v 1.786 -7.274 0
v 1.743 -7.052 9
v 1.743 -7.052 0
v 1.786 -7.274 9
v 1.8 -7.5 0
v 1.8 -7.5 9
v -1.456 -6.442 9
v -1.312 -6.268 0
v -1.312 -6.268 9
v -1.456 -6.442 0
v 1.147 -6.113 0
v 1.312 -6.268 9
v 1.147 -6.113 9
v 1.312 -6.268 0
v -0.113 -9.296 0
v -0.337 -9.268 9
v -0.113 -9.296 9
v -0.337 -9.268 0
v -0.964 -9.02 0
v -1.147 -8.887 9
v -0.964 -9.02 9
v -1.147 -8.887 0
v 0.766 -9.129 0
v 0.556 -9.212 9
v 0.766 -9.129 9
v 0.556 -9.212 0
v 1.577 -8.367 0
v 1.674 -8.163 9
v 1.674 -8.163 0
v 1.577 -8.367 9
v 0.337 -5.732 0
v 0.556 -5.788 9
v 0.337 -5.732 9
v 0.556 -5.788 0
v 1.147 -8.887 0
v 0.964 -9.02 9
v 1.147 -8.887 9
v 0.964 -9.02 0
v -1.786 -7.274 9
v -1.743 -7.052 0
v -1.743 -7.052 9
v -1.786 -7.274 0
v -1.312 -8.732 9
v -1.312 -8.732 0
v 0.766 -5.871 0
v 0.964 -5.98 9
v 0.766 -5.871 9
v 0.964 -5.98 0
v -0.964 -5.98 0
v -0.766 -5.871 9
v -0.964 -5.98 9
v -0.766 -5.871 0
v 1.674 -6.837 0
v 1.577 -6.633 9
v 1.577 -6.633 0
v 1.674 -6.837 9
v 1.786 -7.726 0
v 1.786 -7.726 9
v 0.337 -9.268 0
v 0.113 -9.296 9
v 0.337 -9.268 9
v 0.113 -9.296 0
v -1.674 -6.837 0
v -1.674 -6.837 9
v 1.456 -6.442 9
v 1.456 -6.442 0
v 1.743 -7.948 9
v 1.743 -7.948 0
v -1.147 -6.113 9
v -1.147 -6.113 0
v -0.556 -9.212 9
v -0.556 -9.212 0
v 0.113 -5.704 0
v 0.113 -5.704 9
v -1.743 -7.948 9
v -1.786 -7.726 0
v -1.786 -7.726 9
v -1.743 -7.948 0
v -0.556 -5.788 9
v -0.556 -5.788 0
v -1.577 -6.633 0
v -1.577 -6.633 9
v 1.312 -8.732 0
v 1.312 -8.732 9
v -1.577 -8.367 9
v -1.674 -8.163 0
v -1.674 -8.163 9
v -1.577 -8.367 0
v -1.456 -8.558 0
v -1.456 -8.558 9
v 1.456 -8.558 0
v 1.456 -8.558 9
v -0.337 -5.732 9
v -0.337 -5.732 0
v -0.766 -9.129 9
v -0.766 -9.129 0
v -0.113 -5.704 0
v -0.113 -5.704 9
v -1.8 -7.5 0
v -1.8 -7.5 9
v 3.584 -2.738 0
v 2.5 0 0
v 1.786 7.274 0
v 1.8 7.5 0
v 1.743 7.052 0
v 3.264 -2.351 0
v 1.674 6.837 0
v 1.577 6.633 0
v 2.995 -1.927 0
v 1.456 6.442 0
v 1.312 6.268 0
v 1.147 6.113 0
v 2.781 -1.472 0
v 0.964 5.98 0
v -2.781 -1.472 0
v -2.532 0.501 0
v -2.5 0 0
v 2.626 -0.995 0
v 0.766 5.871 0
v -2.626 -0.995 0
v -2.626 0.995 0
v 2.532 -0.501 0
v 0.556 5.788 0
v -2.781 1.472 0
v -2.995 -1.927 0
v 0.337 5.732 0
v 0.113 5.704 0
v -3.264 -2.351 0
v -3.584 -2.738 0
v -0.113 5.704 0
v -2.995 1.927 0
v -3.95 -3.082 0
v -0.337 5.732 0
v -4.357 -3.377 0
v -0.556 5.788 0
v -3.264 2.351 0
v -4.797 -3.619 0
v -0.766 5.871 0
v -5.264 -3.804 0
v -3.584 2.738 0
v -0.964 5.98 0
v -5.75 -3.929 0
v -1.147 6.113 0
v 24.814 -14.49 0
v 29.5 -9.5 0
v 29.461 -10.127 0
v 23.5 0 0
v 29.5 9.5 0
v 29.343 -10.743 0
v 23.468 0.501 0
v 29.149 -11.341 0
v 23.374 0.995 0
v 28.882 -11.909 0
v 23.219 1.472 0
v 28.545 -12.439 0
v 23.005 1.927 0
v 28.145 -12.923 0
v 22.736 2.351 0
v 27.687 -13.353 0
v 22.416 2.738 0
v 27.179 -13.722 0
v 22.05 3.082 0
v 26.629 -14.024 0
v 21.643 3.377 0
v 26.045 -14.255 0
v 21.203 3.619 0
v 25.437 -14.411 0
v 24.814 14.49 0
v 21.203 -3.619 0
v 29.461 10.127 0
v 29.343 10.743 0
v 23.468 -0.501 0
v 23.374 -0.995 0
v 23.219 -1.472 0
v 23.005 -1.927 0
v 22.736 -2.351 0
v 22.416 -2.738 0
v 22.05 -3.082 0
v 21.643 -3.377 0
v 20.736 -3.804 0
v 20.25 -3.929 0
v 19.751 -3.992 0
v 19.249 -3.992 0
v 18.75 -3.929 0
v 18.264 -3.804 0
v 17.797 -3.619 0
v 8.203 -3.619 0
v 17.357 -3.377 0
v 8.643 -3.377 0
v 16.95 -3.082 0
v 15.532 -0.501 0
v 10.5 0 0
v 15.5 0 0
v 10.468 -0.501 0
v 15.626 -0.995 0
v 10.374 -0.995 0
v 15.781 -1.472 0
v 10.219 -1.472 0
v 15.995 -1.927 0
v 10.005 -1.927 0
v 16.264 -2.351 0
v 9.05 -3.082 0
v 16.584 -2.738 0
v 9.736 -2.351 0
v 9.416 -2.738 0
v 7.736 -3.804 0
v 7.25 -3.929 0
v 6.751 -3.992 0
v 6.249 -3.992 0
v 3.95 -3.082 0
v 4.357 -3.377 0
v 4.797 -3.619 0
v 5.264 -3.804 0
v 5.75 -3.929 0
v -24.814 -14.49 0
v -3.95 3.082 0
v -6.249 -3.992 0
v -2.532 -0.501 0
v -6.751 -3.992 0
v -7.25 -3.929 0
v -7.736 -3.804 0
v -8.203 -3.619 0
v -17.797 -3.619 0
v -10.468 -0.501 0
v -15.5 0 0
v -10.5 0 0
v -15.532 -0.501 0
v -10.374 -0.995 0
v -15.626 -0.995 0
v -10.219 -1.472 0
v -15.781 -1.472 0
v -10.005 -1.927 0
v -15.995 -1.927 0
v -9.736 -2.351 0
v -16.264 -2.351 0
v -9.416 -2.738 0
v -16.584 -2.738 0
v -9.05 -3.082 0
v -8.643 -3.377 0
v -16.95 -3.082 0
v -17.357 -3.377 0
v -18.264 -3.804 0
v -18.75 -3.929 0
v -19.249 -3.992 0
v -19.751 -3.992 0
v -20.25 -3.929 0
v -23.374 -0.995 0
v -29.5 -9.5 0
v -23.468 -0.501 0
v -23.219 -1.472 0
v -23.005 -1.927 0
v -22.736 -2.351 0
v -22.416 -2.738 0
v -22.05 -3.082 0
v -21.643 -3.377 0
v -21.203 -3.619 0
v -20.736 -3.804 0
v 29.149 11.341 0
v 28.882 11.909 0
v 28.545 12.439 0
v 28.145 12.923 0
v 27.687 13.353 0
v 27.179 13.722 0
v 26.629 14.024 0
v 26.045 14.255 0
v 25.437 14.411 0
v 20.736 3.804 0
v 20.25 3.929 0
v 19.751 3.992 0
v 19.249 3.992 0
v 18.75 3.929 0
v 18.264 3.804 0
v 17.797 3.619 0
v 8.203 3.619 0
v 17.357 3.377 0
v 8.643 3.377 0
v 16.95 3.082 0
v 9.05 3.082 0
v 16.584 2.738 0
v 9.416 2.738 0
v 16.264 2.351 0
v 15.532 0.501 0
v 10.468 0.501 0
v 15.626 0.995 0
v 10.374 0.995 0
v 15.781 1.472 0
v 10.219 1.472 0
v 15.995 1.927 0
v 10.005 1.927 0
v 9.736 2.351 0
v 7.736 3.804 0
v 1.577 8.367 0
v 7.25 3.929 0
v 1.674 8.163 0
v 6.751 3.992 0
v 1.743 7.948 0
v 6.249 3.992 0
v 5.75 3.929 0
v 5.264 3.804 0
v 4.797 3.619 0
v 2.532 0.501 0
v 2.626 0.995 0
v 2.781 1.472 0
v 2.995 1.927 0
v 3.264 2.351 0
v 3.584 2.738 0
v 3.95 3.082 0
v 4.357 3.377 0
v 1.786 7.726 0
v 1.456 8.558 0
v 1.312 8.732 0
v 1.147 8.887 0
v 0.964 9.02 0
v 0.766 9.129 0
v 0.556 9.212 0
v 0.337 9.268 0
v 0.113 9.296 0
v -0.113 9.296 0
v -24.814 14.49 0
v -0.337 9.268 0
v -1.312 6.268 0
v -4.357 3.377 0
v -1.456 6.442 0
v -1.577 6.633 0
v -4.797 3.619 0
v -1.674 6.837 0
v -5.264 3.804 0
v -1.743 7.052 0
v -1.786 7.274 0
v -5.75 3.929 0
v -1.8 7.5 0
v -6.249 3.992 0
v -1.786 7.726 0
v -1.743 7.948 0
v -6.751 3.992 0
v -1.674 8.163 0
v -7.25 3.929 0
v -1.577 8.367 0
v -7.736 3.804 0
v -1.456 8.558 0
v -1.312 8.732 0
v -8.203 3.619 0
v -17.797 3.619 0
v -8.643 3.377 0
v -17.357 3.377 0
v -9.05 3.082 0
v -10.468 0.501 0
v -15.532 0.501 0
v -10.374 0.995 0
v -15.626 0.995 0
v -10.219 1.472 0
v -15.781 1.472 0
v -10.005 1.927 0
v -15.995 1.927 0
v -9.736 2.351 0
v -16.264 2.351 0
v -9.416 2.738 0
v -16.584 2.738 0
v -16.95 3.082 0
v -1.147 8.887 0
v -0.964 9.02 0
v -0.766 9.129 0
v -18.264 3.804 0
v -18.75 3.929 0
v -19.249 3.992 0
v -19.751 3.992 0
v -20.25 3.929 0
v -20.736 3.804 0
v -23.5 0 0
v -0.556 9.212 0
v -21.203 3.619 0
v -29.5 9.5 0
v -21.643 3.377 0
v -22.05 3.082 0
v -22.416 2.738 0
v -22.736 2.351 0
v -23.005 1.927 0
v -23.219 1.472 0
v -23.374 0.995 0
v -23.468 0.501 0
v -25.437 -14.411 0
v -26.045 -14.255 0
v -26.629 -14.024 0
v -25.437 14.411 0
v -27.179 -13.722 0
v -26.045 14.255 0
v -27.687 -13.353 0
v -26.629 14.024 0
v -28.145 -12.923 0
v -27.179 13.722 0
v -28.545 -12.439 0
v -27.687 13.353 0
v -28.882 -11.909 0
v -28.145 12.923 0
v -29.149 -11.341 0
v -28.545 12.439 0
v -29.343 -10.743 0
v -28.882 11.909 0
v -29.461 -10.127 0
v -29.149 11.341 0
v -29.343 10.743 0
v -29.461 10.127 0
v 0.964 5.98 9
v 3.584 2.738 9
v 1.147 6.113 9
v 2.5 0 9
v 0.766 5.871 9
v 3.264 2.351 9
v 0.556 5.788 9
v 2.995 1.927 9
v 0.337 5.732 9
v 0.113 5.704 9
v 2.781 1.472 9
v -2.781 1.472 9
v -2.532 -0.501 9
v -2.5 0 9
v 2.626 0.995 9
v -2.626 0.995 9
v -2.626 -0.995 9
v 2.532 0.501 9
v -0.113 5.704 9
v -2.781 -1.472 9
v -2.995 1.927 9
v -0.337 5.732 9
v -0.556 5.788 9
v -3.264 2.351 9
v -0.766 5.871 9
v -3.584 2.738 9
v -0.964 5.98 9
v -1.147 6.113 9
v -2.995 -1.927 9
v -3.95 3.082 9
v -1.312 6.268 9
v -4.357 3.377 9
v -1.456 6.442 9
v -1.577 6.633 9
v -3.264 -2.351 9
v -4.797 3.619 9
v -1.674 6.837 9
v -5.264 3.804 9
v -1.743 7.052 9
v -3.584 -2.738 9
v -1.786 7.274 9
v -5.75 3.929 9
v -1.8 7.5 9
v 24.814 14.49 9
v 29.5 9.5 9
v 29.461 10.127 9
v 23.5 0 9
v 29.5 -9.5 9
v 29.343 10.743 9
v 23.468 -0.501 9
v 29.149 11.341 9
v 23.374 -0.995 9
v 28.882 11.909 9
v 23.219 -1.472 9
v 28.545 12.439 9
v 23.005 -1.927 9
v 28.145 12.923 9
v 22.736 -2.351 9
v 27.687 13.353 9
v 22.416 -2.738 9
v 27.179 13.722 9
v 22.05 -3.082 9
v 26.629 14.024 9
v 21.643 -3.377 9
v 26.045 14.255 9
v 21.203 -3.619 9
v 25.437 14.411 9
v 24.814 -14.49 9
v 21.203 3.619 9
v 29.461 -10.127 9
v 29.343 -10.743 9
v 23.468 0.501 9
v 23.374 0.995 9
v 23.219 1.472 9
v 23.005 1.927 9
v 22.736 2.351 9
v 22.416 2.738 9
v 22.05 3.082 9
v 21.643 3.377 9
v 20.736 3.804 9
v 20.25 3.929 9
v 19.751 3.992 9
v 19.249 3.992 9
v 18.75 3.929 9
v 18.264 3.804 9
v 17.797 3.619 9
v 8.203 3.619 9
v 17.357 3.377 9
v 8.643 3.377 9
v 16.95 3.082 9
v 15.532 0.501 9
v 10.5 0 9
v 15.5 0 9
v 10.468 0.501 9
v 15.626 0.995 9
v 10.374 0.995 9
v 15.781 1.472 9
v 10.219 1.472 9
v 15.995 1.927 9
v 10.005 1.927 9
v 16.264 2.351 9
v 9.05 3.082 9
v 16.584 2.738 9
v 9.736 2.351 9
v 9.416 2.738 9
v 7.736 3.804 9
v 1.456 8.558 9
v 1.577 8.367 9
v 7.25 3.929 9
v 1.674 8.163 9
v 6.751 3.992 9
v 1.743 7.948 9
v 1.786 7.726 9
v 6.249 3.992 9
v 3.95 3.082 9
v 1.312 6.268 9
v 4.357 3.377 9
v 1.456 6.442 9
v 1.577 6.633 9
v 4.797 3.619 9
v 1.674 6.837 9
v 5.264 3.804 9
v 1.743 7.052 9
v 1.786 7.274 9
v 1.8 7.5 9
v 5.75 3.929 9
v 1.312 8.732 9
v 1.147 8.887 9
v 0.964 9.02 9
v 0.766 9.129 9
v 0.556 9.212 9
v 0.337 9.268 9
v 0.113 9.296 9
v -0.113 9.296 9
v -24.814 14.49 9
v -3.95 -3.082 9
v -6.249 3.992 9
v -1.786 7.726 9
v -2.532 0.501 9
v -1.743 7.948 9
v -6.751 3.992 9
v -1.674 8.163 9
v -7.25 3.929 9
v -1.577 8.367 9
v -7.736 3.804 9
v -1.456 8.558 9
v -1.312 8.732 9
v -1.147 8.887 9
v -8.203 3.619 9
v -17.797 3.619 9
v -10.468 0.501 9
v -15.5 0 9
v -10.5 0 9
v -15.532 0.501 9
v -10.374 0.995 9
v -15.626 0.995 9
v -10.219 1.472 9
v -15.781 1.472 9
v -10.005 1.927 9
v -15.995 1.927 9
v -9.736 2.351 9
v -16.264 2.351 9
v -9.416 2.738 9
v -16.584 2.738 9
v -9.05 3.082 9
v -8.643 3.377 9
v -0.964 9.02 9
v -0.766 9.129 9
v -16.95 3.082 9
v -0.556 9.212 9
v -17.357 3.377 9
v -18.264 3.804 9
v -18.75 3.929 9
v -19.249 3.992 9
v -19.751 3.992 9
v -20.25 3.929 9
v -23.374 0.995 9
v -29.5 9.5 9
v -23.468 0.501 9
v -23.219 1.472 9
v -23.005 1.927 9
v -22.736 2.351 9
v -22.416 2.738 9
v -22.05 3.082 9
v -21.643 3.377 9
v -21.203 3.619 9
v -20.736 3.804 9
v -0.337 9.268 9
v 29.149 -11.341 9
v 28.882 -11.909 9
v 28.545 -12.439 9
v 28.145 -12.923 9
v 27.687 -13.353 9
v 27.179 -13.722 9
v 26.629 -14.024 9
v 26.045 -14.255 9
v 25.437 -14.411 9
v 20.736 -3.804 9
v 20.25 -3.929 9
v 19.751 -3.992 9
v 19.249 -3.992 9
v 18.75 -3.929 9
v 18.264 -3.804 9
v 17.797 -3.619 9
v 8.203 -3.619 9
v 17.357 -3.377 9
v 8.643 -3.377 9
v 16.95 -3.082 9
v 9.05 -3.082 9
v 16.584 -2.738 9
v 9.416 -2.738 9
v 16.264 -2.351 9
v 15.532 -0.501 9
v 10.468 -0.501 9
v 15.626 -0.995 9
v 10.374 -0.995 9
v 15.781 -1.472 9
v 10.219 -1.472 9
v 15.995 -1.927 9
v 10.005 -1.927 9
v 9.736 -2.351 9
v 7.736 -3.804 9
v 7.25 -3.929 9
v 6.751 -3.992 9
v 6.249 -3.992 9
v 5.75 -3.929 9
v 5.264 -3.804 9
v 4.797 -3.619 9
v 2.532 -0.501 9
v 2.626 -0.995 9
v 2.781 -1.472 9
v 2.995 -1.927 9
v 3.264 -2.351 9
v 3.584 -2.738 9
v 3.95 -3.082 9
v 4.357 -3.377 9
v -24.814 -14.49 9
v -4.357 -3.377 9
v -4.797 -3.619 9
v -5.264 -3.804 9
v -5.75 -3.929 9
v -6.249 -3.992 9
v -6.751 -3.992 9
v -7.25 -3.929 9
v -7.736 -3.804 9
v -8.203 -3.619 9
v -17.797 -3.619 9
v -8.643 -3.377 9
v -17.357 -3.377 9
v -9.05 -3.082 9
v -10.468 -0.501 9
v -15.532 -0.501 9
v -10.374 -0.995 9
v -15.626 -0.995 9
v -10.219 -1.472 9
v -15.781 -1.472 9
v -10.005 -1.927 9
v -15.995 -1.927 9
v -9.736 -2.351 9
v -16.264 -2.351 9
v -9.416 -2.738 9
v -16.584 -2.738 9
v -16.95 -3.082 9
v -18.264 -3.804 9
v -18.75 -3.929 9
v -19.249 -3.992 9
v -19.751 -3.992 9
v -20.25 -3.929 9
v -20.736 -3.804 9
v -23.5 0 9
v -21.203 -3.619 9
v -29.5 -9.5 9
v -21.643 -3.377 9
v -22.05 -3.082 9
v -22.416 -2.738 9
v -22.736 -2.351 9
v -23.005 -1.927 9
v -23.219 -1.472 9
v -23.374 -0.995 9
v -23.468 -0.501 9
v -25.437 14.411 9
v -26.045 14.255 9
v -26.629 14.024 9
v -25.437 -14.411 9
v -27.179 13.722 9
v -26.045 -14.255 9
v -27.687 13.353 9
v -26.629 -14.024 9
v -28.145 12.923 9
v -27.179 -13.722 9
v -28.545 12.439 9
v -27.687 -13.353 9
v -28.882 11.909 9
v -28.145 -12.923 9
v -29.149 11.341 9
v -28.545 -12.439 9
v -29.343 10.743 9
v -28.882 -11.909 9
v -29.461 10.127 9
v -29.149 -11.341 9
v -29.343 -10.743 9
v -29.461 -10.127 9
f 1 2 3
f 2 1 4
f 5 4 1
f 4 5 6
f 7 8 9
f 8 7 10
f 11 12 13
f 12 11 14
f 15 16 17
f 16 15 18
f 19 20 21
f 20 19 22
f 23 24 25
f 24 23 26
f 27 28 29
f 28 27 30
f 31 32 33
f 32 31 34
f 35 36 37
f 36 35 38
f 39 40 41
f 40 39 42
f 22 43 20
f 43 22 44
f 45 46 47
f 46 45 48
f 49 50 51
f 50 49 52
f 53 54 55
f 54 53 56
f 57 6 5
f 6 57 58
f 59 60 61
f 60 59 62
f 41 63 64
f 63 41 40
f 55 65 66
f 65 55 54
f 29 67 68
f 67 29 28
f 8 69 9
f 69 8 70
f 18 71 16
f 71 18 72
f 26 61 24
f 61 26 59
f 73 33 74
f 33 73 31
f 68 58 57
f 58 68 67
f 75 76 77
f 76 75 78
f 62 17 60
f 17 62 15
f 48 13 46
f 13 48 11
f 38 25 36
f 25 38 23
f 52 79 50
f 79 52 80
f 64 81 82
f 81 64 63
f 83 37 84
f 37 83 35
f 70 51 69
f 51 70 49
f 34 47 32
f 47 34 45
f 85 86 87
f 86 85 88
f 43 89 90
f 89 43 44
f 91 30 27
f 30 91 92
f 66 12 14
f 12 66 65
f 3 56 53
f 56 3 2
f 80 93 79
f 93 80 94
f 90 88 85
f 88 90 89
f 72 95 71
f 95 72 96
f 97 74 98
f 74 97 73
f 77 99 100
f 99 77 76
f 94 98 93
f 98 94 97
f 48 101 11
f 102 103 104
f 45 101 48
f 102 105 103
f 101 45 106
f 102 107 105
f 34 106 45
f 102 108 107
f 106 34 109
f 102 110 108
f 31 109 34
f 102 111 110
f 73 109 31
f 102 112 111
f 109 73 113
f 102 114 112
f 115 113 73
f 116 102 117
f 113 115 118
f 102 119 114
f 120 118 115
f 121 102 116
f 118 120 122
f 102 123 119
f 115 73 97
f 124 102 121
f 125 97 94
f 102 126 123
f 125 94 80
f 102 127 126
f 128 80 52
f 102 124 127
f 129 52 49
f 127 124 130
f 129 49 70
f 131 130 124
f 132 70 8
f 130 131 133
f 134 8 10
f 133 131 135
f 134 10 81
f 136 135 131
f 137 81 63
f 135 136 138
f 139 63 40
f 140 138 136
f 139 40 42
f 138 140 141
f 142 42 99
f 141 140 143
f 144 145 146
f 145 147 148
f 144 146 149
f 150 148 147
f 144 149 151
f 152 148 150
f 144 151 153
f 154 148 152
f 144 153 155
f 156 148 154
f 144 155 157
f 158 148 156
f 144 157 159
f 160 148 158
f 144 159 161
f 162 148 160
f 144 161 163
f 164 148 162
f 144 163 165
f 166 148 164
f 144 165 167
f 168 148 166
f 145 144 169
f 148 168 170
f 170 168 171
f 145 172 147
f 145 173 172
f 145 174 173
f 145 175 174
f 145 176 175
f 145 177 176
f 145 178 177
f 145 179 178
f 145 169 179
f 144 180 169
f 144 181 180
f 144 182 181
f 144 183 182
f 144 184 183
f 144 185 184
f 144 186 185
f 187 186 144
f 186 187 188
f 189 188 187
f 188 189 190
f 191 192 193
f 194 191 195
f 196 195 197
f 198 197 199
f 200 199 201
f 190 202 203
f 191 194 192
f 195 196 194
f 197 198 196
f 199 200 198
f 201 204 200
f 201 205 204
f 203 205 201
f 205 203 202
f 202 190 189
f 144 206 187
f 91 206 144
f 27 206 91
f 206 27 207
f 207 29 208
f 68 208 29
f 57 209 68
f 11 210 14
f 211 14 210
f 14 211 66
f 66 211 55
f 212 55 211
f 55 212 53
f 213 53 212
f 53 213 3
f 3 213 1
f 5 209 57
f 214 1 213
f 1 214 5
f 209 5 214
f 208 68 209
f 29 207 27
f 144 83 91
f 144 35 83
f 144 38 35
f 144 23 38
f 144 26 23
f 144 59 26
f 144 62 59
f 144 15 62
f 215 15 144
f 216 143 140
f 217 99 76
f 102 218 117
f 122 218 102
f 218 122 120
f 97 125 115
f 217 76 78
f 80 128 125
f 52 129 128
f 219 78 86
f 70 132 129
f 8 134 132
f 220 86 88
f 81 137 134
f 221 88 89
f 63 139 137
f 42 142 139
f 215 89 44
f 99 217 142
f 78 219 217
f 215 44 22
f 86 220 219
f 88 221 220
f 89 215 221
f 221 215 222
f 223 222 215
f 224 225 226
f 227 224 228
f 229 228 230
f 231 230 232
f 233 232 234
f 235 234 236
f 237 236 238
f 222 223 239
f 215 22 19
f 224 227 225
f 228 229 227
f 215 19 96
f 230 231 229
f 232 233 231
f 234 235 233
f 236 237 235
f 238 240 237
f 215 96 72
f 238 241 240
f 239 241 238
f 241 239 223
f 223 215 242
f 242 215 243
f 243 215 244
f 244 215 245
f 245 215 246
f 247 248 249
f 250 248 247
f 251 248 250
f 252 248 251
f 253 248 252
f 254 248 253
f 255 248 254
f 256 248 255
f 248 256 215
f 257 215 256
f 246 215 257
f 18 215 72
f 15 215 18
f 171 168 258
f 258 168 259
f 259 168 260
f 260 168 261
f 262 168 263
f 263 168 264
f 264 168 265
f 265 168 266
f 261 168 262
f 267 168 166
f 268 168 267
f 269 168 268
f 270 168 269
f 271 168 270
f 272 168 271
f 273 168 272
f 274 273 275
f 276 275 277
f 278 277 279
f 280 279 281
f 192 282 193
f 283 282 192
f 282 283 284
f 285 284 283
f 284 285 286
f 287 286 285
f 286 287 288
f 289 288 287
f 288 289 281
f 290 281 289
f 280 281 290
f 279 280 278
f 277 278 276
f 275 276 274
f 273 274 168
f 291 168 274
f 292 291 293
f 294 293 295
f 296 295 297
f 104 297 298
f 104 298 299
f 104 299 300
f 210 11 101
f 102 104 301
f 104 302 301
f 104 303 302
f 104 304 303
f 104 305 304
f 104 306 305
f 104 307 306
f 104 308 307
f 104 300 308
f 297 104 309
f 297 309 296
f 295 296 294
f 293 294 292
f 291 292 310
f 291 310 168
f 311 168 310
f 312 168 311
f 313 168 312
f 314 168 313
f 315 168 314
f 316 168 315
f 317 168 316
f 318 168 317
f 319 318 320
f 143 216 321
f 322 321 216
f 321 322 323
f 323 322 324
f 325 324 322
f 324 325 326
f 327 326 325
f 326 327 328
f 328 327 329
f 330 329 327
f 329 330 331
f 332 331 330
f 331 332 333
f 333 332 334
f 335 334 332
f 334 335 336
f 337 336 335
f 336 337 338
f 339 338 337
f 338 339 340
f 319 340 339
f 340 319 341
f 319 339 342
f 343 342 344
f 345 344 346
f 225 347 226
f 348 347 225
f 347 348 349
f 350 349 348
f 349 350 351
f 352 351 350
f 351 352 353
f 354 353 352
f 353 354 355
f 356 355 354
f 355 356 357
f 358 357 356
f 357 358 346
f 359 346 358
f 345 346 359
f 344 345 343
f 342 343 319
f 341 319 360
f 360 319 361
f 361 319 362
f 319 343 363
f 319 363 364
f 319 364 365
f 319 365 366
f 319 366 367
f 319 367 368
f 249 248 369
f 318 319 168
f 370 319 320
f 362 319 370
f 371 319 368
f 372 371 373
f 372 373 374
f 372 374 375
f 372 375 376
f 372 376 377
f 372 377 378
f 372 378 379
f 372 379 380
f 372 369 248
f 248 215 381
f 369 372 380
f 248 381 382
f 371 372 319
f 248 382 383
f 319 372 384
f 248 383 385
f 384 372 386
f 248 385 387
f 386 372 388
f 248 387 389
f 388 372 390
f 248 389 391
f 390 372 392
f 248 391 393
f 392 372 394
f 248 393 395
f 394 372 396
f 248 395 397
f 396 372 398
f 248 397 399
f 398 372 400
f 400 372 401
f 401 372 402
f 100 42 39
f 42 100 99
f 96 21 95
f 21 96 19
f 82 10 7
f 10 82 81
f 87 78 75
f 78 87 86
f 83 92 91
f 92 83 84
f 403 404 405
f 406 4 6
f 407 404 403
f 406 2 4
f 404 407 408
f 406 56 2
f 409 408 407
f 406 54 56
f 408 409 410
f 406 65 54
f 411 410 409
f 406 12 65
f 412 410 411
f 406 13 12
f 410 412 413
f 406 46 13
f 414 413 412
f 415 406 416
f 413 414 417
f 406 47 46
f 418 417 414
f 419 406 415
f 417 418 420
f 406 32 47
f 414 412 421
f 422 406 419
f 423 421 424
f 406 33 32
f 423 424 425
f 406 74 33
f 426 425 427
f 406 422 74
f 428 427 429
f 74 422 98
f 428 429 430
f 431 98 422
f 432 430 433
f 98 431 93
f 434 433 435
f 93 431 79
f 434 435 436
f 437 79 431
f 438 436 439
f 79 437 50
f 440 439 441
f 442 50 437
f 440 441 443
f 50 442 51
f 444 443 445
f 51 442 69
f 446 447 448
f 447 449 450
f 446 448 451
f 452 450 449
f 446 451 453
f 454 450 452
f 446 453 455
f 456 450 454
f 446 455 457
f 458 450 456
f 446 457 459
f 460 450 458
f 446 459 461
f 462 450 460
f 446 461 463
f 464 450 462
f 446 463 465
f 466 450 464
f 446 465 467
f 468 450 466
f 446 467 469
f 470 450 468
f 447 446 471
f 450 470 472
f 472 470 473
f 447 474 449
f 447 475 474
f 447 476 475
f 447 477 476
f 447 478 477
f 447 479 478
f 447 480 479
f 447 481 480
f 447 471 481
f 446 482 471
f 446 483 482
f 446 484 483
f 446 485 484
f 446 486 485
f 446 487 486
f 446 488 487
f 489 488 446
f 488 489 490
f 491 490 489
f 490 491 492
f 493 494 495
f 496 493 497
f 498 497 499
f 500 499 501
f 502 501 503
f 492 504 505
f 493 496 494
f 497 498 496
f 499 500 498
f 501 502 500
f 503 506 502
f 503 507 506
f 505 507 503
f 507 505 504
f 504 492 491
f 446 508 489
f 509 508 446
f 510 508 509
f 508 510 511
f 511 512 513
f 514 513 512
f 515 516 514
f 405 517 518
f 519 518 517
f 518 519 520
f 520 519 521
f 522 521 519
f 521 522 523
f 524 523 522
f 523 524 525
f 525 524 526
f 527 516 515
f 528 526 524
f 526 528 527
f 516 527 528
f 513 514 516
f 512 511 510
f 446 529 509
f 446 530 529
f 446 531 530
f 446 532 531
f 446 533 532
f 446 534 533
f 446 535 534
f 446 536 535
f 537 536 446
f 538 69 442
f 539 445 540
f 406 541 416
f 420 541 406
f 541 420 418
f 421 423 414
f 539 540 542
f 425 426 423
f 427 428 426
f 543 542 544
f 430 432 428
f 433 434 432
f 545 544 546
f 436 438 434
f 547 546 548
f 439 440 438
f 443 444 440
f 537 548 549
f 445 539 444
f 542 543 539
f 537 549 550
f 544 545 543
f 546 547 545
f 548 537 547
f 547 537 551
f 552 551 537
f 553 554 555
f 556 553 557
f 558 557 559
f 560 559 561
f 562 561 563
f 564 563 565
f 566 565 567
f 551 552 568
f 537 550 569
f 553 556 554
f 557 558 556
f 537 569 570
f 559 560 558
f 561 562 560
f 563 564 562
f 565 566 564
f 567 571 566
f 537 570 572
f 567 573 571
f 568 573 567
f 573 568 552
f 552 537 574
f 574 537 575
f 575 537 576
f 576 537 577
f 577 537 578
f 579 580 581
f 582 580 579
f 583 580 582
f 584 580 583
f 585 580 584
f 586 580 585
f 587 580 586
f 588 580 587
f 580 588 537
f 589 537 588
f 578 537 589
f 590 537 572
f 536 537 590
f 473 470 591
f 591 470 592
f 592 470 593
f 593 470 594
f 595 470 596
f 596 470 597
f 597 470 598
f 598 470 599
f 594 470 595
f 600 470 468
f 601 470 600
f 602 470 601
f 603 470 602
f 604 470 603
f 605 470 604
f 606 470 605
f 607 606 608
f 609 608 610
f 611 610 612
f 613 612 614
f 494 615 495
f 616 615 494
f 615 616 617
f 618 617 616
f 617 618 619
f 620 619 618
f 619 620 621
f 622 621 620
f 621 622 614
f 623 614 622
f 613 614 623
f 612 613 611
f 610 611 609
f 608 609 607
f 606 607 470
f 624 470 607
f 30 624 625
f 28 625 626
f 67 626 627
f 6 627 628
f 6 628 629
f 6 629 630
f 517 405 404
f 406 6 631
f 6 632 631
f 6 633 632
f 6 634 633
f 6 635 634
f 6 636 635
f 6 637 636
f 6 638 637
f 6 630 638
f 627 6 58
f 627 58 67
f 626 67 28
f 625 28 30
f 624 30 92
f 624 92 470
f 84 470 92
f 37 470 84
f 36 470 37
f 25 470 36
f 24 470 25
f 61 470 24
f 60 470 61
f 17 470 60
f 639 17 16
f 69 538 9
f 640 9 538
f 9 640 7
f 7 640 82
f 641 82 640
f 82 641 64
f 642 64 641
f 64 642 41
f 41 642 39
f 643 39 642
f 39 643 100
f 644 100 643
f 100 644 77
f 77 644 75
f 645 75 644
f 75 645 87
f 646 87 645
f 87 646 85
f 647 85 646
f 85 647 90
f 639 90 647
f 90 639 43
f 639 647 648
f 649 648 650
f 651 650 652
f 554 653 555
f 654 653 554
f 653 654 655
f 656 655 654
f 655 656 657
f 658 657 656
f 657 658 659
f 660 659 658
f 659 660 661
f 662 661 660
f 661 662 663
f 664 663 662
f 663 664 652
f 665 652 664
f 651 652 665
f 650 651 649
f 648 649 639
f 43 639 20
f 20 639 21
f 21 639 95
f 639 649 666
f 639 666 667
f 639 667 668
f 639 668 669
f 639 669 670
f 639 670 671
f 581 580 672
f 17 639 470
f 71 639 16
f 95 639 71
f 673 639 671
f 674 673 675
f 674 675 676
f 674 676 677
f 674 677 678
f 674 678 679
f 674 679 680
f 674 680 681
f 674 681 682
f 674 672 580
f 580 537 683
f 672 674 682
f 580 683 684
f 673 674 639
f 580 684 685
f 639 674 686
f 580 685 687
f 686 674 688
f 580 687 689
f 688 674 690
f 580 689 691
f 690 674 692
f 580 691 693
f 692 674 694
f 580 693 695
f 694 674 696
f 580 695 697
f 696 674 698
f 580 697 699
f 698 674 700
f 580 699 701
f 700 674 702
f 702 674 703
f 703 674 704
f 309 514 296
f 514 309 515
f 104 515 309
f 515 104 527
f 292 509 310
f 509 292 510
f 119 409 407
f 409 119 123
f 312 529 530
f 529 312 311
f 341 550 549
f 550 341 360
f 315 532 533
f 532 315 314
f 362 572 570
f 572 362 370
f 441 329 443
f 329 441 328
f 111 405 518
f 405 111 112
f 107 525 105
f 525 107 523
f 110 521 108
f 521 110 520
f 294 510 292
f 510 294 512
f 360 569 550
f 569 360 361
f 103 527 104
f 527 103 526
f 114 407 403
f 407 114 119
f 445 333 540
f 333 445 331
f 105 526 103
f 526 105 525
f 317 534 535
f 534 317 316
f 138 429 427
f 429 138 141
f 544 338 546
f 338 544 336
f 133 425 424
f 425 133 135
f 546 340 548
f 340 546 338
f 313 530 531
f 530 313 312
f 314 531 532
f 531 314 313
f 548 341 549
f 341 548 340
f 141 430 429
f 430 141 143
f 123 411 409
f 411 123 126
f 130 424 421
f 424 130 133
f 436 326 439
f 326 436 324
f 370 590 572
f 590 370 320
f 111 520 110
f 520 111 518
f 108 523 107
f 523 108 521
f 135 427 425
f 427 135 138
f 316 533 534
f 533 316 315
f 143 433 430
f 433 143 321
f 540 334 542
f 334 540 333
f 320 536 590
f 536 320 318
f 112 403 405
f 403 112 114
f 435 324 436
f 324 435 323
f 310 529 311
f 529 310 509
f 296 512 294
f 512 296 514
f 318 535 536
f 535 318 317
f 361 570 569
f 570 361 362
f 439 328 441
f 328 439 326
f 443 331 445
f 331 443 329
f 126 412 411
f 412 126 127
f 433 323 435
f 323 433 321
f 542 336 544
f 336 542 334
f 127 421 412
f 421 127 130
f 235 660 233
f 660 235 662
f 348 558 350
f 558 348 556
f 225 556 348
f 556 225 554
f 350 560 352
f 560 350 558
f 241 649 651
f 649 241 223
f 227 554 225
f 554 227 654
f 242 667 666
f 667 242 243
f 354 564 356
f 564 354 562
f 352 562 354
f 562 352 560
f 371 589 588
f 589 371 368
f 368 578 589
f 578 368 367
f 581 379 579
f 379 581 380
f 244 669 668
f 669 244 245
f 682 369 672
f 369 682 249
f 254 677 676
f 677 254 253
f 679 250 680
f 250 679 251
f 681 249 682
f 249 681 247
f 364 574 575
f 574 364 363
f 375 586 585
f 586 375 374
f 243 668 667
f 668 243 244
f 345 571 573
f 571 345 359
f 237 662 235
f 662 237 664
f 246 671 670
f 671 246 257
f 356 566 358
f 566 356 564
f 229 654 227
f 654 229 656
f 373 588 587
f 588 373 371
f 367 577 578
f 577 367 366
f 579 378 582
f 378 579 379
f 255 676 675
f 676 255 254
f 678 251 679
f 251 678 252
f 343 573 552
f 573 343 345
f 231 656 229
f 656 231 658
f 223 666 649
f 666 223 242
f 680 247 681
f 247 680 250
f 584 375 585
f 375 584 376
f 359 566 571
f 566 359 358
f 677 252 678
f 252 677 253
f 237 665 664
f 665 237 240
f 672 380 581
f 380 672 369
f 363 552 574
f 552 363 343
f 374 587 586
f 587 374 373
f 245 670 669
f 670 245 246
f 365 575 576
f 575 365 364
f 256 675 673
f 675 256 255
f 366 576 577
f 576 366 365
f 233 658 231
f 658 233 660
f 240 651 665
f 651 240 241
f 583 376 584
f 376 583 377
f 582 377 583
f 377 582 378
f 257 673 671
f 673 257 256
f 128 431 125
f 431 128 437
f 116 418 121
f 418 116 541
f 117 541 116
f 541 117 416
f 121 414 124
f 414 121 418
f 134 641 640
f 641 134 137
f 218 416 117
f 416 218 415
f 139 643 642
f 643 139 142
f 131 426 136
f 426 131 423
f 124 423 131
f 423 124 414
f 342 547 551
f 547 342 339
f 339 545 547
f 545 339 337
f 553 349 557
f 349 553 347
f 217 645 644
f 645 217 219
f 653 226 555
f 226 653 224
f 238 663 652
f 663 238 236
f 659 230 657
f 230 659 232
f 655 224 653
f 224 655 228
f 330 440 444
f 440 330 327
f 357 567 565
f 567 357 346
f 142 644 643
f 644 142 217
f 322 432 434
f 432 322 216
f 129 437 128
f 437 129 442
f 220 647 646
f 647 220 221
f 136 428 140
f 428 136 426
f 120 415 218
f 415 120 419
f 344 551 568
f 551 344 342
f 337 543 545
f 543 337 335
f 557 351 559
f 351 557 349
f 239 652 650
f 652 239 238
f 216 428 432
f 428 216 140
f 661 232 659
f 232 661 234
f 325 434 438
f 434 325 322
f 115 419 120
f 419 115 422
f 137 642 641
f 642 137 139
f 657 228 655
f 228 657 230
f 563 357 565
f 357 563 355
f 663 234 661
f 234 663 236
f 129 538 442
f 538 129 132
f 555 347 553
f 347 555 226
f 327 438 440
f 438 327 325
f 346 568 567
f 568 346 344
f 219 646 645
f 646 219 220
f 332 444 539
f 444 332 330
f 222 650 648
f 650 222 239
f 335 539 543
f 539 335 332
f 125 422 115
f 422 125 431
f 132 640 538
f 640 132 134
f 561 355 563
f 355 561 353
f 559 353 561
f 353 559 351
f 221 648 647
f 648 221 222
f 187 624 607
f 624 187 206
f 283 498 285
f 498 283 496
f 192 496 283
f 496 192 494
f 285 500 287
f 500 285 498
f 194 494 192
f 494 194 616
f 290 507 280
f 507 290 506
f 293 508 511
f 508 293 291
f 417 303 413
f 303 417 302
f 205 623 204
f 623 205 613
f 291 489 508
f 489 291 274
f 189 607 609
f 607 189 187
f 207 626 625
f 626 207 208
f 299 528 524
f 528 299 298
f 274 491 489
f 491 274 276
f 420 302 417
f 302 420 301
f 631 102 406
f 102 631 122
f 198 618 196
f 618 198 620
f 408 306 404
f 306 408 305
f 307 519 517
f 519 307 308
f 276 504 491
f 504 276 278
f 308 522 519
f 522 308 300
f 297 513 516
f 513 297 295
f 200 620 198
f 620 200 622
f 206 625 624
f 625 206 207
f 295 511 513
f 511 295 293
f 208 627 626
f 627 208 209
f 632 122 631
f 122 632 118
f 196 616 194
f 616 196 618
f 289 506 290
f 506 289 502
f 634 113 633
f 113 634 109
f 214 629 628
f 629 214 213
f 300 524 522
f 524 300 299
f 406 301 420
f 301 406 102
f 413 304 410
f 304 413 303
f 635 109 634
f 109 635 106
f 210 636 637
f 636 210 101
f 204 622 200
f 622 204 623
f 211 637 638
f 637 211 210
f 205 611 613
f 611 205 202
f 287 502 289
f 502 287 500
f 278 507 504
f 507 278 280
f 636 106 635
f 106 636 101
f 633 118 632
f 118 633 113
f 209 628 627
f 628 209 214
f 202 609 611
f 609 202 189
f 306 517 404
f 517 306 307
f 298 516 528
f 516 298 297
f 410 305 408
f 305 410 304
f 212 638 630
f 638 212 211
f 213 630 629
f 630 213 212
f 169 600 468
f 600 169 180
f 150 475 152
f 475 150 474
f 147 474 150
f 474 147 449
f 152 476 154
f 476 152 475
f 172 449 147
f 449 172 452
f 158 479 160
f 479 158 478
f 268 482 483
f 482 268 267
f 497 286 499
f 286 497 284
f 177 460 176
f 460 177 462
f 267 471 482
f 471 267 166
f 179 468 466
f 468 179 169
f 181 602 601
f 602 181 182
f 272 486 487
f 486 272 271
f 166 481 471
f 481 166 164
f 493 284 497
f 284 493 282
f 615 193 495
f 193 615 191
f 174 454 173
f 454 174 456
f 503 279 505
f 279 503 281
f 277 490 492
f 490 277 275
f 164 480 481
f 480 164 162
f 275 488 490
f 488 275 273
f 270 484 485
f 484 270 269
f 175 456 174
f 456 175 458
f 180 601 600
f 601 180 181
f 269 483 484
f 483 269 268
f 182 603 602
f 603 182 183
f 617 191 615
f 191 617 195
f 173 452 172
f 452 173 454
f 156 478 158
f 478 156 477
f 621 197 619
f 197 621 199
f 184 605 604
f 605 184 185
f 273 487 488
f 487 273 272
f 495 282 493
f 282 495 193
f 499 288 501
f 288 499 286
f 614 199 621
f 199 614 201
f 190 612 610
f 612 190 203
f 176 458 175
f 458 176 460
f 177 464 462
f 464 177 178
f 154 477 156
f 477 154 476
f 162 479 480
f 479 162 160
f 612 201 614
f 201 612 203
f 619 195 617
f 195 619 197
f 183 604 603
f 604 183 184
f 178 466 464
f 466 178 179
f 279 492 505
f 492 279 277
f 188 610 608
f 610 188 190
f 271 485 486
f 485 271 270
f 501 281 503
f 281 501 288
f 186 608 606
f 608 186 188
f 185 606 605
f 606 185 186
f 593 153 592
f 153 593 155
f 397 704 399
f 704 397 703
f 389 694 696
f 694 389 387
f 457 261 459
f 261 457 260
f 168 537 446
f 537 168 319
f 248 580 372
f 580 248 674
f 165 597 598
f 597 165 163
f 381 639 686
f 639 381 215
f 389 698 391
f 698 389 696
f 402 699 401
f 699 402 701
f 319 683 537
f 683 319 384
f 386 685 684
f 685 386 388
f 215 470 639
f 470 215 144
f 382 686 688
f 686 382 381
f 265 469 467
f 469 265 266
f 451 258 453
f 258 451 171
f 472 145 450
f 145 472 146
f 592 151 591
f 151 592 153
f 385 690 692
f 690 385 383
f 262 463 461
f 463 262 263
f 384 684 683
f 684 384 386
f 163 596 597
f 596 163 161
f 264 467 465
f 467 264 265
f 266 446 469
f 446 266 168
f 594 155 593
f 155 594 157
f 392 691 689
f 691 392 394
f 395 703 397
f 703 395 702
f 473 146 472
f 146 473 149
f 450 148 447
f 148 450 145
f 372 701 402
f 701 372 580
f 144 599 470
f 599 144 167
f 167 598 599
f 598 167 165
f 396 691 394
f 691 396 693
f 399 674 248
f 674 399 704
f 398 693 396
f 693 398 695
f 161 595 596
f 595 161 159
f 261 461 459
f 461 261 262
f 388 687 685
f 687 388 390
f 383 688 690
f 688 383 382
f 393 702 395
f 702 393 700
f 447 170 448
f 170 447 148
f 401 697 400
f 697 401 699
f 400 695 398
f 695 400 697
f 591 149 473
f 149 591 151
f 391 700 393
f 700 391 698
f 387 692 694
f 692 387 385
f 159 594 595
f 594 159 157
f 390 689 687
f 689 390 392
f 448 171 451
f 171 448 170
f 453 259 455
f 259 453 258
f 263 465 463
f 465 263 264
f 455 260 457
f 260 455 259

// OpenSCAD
$fn = 50;

difference() {
	union() {
		hull() {
			translate(v = [-24.5, 9.5, 0]) {
				cylinder(h = 9, r = 5);
			}
			translate(v = [24.5, 9.5, 0]) {
				cylinder(h = 9, r = 5);
			}
			translate(v = [-24.5, -9.5, 0]) {
				cylinder(h = 9, r = 5);
			}
			translate(v = [24.5, -9.5, 0]) {
				cylinder(h = 9, r = 5);
			}
		}
	}
	union() {
		translate(v = [0.0, -7.5, 0]) {
			cylinder(h = 9, r = 1.8);
		}
		translate(v = [0.0, 7.5, 0]) {
			cylinder(h = 9, r = 1.8);
		}
		translate(v = [-19.5, 0, 0.0]) {
			cylinder(h = 9, r = 4.0);
		}
		translate(v = [-6.5, 0, 0.0]) {
			cylinder(h = 9, r = 4.0);
		}
		translate(v = [6.5, 0, 0.0]) {
			cylinder(h = 9, r = 4.0);
		}
		translate(v = [19.5, 0, 0.0]) {
			cylinder(h = 9, r = 4.0);
		}
	}
}
